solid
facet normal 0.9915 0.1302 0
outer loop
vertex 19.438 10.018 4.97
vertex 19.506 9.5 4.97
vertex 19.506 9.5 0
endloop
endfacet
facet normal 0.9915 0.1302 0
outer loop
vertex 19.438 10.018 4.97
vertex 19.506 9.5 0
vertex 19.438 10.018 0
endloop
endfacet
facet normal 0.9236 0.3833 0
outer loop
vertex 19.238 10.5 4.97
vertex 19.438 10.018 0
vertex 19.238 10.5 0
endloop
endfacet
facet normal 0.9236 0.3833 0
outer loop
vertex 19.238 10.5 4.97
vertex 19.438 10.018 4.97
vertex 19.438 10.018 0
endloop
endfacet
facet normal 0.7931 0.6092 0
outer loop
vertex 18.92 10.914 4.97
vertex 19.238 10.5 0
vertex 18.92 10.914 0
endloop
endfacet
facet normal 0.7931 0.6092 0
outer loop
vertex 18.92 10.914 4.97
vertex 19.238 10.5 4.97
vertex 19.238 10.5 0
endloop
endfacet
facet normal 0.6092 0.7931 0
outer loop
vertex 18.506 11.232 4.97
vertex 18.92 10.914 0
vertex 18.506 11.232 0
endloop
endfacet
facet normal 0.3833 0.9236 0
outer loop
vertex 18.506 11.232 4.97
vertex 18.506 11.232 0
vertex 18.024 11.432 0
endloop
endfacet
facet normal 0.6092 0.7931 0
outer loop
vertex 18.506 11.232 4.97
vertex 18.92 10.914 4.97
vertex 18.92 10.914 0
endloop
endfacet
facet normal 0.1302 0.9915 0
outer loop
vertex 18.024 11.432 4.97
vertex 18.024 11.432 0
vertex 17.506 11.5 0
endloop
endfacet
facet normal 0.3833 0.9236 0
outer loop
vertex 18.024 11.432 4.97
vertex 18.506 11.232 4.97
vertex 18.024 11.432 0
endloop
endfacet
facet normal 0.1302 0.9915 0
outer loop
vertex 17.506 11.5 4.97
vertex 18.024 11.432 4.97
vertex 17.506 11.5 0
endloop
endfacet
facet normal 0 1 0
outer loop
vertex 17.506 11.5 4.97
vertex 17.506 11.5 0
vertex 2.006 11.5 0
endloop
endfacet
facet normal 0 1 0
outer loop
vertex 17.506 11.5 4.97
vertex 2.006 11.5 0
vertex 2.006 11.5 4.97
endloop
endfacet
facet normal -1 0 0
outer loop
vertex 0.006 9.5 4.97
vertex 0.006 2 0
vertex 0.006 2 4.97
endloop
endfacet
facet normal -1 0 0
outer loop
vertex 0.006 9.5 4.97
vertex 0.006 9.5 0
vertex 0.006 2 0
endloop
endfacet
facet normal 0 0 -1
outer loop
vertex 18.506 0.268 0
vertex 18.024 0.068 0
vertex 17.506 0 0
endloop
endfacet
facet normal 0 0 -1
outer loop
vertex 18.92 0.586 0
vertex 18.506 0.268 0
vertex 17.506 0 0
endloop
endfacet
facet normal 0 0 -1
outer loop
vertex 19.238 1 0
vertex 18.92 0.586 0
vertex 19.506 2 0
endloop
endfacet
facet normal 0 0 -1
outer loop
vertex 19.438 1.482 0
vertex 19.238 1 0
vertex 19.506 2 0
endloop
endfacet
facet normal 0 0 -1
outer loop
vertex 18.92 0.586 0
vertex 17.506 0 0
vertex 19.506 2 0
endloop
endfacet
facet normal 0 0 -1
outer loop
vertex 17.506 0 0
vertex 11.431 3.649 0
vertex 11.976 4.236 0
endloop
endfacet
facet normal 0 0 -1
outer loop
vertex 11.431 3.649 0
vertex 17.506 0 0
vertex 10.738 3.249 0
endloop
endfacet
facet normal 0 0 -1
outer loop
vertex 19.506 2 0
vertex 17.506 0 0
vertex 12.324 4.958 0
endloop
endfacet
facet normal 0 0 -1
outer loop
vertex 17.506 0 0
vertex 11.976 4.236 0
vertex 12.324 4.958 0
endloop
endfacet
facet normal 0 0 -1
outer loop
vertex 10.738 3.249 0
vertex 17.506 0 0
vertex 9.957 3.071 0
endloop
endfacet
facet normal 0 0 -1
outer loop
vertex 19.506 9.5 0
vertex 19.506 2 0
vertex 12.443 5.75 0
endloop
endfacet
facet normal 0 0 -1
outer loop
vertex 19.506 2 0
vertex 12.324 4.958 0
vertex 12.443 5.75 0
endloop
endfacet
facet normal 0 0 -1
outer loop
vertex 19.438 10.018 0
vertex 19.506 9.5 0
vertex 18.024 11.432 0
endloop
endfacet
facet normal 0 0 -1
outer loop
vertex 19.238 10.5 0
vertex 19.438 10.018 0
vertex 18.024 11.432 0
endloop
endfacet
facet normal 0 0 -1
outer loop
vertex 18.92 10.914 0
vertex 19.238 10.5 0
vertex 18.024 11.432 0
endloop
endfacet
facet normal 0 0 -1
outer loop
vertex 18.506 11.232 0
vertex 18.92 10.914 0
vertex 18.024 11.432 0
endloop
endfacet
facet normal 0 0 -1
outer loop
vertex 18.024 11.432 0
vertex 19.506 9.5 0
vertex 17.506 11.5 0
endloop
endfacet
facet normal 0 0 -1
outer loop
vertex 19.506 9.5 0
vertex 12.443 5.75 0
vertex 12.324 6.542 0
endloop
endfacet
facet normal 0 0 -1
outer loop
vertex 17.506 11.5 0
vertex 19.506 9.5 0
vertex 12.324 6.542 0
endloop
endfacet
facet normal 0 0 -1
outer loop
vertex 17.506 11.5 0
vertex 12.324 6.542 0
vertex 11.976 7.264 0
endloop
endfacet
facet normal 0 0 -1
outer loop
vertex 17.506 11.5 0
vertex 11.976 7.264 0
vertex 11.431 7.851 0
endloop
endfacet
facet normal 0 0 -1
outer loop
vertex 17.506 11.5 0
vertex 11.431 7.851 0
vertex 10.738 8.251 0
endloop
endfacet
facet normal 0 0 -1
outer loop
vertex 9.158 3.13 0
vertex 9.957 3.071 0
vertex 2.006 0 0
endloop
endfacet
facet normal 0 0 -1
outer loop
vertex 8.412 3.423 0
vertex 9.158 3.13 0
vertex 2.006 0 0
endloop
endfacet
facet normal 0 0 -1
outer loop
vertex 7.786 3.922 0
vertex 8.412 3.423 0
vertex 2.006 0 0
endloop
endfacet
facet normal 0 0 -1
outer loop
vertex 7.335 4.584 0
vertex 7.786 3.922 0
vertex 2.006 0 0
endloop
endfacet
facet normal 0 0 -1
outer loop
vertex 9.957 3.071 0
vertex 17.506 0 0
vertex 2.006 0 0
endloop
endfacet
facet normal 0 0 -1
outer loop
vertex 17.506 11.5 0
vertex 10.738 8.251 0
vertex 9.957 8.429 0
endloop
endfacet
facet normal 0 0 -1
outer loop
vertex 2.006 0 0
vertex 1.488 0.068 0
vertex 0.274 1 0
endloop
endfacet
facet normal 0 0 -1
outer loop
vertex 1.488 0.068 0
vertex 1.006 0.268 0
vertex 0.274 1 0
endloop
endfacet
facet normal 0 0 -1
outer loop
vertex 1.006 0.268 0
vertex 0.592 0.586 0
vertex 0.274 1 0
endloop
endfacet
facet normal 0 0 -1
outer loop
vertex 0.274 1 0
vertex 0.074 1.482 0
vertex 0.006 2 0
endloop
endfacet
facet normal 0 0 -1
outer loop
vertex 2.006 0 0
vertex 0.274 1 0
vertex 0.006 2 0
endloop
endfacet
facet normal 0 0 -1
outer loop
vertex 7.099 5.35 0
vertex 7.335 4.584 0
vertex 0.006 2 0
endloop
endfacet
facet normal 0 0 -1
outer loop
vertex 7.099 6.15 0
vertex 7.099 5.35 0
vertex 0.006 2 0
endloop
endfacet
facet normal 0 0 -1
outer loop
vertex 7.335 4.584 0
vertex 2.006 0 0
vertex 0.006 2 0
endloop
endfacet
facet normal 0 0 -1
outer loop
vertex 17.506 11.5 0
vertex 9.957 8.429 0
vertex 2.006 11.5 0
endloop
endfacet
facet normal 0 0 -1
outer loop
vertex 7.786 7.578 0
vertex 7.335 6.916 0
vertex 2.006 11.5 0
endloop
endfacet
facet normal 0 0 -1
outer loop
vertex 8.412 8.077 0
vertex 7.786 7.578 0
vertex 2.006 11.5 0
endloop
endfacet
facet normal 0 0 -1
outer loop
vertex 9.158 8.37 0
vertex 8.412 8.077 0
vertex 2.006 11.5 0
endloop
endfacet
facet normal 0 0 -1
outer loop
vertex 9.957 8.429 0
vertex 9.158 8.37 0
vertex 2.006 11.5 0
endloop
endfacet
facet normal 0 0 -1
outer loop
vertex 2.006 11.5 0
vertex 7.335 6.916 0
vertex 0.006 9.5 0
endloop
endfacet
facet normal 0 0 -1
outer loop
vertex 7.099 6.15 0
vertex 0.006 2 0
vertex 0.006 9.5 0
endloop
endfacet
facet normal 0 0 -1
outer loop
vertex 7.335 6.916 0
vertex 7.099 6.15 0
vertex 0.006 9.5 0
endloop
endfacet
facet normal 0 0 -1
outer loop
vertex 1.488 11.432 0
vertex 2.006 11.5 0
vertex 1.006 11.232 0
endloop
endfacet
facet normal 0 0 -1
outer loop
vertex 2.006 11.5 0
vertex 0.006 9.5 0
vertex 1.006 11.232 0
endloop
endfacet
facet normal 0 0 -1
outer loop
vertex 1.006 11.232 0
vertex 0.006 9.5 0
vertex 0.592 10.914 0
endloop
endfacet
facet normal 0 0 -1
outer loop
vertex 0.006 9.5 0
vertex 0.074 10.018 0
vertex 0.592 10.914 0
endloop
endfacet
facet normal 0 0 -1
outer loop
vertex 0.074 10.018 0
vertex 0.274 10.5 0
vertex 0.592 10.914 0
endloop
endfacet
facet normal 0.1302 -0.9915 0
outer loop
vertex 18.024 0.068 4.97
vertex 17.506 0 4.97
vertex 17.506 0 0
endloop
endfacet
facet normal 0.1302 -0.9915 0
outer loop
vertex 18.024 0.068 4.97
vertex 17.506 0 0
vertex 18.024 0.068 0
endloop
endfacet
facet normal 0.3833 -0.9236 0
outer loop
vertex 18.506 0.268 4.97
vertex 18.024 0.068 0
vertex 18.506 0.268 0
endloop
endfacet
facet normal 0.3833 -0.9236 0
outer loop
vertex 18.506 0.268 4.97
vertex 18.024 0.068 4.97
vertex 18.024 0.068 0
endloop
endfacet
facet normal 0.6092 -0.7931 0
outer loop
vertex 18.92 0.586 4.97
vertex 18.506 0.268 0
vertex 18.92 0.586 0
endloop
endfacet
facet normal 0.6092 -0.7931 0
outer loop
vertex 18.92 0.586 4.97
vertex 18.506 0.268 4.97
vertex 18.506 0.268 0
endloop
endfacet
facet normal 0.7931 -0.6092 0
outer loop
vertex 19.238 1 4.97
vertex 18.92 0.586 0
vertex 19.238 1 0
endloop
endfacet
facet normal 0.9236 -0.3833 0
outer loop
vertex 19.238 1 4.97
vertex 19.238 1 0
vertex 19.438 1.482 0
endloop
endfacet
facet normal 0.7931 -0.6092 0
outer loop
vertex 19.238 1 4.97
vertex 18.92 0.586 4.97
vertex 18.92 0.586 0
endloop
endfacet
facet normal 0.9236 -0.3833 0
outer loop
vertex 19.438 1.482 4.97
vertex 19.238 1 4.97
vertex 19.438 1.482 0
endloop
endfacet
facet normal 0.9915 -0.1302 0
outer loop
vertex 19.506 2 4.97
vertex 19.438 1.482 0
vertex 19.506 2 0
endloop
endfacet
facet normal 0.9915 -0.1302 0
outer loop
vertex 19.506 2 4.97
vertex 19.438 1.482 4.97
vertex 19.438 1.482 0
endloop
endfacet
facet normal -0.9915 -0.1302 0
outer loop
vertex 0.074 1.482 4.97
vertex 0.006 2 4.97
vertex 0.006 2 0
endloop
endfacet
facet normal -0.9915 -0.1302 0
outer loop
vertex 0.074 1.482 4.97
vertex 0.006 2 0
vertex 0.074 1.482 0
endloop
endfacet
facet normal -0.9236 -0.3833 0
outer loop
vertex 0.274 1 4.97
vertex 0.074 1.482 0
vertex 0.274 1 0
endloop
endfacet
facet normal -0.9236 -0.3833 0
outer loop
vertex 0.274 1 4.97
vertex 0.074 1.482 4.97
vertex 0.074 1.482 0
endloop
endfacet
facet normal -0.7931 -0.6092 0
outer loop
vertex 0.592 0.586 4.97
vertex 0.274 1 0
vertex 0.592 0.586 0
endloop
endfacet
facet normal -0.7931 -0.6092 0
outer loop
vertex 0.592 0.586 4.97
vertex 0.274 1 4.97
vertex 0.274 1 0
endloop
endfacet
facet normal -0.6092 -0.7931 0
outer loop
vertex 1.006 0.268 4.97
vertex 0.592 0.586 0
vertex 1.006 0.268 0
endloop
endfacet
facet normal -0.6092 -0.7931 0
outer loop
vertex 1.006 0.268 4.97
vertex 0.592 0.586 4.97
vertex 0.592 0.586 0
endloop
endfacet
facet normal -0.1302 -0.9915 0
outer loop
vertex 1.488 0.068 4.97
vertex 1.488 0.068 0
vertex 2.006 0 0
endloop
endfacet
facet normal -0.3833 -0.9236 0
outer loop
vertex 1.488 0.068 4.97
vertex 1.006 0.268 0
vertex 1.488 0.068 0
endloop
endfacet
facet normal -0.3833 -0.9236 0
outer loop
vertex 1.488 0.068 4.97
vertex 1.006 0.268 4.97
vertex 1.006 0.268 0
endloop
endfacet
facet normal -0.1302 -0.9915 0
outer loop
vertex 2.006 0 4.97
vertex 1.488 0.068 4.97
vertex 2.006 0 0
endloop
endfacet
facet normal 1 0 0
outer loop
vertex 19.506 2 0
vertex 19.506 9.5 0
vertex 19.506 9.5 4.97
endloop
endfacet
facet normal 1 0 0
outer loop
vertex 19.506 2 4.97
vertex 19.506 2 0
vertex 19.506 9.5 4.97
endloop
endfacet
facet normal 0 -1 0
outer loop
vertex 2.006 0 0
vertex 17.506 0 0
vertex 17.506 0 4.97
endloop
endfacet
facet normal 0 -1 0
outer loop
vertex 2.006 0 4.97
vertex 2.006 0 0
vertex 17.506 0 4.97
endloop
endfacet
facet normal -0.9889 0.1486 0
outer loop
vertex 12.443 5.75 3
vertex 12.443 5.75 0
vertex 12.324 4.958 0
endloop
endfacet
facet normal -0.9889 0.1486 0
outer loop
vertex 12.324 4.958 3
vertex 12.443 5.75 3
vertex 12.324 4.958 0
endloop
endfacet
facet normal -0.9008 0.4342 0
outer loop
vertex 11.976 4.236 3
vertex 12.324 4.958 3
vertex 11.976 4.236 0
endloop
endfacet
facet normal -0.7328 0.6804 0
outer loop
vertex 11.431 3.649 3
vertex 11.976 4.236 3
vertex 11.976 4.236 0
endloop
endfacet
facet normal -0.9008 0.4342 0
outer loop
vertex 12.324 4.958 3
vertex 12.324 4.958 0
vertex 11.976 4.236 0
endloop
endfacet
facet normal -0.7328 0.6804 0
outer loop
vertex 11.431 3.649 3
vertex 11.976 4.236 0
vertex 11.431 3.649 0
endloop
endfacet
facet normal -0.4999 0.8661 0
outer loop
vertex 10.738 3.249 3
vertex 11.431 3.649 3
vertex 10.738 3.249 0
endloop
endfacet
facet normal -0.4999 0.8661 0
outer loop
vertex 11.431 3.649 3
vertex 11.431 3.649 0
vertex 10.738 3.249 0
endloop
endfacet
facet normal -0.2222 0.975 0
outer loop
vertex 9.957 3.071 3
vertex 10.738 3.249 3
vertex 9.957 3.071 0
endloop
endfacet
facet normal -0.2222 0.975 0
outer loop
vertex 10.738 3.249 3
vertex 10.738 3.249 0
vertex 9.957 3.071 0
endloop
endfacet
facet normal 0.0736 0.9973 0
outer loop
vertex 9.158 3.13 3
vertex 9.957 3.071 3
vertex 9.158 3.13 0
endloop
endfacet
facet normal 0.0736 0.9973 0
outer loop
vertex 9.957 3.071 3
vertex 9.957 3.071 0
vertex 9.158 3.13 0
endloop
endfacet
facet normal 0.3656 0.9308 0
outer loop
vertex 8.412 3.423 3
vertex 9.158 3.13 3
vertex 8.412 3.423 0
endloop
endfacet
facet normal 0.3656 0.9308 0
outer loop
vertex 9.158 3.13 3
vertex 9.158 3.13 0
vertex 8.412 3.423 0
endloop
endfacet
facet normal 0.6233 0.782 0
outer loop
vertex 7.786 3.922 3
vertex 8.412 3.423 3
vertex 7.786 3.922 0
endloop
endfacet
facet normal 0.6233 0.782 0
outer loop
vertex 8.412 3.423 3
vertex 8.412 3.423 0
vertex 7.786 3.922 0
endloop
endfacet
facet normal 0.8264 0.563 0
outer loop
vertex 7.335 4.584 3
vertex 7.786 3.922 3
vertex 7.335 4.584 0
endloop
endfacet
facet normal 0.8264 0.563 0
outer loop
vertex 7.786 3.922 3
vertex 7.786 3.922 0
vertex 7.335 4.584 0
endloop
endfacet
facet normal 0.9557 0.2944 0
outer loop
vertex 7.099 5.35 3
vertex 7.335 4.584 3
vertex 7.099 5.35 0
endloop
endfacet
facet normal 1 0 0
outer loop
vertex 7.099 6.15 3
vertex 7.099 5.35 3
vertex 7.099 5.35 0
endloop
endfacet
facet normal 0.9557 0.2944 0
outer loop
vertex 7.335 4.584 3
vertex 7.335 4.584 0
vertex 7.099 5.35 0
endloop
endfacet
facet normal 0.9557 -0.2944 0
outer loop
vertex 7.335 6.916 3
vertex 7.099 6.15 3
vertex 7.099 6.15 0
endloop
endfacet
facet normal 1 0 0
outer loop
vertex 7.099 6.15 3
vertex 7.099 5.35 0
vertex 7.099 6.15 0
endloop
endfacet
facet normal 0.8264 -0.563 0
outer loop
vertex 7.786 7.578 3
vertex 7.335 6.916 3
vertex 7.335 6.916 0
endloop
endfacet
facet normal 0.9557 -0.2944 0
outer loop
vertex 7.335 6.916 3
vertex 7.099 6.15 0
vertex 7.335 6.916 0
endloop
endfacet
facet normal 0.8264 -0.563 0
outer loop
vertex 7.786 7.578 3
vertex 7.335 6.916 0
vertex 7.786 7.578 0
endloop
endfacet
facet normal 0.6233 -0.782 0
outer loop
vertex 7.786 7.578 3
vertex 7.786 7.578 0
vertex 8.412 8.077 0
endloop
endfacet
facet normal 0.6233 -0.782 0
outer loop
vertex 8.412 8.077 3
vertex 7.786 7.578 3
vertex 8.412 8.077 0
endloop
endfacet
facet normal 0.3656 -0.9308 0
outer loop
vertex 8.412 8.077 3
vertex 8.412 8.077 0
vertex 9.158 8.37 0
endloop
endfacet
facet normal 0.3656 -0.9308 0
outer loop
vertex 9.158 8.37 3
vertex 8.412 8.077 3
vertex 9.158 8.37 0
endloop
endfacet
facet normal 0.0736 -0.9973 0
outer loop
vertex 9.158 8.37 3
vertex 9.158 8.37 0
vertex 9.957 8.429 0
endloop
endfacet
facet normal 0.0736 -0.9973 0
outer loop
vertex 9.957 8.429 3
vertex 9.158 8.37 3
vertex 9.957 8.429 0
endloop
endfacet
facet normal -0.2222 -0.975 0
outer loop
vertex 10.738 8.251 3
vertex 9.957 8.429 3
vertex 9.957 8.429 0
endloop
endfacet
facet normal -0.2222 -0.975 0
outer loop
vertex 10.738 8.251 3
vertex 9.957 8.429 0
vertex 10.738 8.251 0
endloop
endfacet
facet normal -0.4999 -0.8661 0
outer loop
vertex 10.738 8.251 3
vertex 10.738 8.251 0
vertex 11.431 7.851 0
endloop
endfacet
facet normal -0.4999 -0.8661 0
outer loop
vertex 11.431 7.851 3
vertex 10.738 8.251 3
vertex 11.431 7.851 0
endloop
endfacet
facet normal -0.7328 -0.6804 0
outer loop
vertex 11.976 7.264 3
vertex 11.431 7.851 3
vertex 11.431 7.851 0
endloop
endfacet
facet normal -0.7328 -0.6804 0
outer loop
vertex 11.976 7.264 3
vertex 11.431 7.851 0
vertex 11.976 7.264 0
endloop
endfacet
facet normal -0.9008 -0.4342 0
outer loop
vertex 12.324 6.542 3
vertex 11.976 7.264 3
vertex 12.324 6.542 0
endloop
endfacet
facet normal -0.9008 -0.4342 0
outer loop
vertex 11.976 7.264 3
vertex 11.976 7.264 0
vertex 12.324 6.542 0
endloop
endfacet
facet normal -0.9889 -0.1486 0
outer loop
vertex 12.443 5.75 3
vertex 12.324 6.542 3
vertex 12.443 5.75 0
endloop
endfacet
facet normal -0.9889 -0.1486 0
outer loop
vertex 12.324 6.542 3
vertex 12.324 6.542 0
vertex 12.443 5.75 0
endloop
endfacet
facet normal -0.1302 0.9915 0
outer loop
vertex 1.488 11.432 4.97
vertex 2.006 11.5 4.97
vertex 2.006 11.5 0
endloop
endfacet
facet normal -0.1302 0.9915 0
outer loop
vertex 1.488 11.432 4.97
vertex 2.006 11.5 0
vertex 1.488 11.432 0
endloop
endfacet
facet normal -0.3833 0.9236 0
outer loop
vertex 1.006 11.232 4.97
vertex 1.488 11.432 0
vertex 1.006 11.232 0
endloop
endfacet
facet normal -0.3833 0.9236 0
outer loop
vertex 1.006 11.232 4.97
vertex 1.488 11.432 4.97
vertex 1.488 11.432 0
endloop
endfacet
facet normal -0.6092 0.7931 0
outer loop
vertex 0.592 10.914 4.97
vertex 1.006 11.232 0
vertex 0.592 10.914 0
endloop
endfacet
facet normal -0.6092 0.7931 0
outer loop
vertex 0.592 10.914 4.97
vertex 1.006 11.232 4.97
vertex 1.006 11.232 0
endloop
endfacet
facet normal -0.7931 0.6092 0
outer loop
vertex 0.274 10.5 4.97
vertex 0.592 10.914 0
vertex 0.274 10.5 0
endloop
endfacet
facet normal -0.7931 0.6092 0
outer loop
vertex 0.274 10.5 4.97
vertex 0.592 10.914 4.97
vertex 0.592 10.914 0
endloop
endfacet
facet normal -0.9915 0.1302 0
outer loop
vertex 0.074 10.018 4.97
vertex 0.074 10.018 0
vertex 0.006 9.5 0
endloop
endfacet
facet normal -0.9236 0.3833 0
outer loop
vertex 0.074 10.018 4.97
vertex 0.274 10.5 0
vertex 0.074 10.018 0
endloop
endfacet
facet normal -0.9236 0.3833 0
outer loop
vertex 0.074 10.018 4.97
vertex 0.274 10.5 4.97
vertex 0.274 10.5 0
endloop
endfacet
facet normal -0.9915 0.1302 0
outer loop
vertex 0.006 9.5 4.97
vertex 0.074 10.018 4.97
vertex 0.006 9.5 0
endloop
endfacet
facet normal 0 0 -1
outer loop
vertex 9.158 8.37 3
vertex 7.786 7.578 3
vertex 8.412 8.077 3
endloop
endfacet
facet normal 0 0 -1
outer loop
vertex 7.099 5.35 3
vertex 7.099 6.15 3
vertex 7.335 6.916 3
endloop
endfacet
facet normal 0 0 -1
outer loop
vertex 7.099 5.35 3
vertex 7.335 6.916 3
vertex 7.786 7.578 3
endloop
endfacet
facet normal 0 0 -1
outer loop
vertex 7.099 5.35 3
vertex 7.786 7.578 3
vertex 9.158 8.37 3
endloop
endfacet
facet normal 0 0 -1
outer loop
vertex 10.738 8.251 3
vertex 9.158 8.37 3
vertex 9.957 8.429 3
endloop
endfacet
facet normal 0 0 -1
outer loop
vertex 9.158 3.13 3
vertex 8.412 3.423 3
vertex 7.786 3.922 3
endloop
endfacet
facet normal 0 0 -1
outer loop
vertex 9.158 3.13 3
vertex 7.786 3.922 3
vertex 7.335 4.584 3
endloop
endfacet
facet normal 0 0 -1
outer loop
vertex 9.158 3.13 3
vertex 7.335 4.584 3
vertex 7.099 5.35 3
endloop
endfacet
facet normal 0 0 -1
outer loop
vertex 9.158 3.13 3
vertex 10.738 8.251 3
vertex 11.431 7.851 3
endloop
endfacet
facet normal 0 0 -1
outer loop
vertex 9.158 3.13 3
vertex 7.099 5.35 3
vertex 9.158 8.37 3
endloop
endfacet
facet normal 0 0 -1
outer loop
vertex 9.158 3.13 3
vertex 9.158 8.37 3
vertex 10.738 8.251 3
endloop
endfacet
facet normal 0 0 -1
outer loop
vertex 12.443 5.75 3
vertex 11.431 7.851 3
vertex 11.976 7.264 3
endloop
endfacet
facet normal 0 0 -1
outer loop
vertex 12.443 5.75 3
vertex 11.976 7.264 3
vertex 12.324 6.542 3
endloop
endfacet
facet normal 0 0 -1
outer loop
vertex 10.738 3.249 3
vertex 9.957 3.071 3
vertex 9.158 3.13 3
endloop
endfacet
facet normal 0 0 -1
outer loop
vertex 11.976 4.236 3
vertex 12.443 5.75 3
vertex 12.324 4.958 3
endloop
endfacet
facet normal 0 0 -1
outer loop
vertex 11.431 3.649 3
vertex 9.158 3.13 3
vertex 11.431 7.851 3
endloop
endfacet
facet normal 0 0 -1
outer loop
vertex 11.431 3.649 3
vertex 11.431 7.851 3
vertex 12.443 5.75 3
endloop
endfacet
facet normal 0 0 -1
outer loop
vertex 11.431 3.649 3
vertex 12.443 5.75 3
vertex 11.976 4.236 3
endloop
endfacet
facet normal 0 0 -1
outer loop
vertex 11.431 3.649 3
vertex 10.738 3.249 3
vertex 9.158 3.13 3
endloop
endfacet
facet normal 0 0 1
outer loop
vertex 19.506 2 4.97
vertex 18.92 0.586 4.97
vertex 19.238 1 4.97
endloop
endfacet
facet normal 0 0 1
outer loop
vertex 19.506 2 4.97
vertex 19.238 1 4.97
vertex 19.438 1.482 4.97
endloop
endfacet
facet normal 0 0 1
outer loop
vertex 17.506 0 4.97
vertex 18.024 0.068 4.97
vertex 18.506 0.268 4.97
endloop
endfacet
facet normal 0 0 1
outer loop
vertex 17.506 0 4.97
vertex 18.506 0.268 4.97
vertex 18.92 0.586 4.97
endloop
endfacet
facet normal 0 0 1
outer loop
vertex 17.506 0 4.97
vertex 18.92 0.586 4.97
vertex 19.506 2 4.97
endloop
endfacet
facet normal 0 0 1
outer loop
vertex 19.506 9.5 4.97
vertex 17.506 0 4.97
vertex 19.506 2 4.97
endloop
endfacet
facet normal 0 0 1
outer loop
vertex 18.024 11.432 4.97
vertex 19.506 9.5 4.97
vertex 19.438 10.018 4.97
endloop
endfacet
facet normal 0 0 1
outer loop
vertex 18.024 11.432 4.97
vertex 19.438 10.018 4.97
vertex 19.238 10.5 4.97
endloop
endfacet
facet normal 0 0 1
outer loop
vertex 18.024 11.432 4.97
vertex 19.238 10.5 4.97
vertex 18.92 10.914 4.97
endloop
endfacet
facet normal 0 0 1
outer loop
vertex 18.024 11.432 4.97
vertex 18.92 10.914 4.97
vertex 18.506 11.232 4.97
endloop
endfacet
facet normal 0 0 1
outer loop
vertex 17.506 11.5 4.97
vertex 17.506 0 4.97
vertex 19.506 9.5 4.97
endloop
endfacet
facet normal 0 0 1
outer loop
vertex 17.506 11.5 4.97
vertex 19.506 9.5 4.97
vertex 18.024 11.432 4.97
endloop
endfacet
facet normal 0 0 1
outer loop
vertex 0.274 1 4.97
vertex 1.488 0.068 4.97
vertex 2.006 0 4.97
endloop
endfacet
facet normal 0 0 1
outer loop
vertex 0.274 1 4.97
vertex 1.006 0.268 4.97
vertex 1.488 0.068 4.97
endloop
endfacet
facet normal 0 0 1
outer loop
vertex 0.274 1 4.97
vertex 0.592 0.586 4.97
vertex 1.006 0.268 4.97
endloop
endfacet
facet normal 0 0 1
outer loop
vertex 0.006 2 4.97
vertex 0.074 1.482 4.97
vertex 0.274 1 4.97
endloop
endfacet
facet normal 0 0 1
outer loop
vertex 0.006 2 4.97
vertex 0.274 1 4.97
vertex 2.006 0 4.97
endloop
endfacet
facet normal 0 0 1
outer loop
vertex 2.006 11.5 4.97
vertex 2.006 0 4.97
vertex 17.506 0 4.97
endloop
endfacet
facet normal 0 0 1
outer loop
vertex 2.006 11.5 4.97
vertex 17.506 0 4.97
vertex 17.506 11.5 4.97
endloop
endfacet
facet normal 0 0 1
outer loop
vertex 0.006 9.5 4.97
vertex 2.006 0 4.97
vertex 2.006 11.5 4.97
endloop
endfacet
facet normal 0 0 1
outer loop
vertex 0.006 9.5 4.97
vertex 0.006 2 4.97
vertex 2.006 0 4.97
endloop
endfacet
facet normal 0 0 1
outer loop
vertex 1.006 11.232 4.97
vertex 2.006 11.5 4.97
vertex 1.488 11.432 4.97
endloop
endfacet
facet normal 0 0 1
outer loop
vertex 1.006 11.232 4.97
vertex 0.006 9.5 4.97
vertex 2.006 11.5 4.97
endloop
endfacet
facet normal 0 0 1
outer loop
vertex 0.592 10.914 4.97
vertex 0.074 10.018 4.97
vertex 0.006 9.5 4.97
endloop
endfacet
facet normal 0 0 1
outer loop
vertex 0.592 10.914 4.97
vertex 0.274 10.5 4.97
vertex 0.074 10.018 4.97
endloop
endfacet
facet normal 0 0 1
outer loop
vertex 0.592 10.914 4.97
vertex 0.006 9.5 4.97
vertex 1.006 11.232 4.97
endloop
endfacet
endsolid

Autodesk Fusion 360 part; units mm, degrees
box "BoxPrimitive1" add length 11.5 width 19.5 height 4.97 placed x (0, 1, 0) y (-1, 0, 0) z (0, 0, 1) at (19.5059, 0, 0)
sketch "Sketch3" plane through (0, 0, 0) normal (0, 0, -1) x (1, 0, 0)
  line L0 (0.0059, -11.5) -> (19.5059, -11.5)
  line L1 (19.5059, -11.5) -> (19.5059, 0)
  line L2 (19.5059, 0) -> (0.0059, 0)
  line L3 (0.0059, 0) -> (0.0059, -11.5)
  line L4 (19.5059, -11.5) -> (0.0059, 0) construction
  line L5 (19.5059, 0) -> (0.0059, -11.5) construction
  line L6 (7.8559, -3.85) -> (11.6559, -3.85) construction
  line L7 (11.6559, -3.85) -> (11.6559, -7.65) construction
  line L8 (11.6559, -7.65) -> (7.8559, -7.65) construction
  line L9 (7.8559, -7.65) -> (7.8559, -3.85) construction
  line L10 (7.8559, -3.85) -> (11.6559, -7.65) construction
  line L11 (11.6559, -3.85) -> (7.8559, -7.65) construction
  circle A0 centre (9.7559, -5.75) radius 2.687
  point P0 (9.7559, -5.75)
  point P1 (9.7559, -5.75)
  dimension "d6" = 3.8
extrude "Extrude1" cut sketch "Sketch3" against normal blind 3 contours A0
fillet "Fillet1" radius 2 4 edges at (0.0059, 11.5, 2.485) (0.0059, 0, 2.485) (19.5059, 11.5, 2.485) (19.5059, 0, 2.485)
